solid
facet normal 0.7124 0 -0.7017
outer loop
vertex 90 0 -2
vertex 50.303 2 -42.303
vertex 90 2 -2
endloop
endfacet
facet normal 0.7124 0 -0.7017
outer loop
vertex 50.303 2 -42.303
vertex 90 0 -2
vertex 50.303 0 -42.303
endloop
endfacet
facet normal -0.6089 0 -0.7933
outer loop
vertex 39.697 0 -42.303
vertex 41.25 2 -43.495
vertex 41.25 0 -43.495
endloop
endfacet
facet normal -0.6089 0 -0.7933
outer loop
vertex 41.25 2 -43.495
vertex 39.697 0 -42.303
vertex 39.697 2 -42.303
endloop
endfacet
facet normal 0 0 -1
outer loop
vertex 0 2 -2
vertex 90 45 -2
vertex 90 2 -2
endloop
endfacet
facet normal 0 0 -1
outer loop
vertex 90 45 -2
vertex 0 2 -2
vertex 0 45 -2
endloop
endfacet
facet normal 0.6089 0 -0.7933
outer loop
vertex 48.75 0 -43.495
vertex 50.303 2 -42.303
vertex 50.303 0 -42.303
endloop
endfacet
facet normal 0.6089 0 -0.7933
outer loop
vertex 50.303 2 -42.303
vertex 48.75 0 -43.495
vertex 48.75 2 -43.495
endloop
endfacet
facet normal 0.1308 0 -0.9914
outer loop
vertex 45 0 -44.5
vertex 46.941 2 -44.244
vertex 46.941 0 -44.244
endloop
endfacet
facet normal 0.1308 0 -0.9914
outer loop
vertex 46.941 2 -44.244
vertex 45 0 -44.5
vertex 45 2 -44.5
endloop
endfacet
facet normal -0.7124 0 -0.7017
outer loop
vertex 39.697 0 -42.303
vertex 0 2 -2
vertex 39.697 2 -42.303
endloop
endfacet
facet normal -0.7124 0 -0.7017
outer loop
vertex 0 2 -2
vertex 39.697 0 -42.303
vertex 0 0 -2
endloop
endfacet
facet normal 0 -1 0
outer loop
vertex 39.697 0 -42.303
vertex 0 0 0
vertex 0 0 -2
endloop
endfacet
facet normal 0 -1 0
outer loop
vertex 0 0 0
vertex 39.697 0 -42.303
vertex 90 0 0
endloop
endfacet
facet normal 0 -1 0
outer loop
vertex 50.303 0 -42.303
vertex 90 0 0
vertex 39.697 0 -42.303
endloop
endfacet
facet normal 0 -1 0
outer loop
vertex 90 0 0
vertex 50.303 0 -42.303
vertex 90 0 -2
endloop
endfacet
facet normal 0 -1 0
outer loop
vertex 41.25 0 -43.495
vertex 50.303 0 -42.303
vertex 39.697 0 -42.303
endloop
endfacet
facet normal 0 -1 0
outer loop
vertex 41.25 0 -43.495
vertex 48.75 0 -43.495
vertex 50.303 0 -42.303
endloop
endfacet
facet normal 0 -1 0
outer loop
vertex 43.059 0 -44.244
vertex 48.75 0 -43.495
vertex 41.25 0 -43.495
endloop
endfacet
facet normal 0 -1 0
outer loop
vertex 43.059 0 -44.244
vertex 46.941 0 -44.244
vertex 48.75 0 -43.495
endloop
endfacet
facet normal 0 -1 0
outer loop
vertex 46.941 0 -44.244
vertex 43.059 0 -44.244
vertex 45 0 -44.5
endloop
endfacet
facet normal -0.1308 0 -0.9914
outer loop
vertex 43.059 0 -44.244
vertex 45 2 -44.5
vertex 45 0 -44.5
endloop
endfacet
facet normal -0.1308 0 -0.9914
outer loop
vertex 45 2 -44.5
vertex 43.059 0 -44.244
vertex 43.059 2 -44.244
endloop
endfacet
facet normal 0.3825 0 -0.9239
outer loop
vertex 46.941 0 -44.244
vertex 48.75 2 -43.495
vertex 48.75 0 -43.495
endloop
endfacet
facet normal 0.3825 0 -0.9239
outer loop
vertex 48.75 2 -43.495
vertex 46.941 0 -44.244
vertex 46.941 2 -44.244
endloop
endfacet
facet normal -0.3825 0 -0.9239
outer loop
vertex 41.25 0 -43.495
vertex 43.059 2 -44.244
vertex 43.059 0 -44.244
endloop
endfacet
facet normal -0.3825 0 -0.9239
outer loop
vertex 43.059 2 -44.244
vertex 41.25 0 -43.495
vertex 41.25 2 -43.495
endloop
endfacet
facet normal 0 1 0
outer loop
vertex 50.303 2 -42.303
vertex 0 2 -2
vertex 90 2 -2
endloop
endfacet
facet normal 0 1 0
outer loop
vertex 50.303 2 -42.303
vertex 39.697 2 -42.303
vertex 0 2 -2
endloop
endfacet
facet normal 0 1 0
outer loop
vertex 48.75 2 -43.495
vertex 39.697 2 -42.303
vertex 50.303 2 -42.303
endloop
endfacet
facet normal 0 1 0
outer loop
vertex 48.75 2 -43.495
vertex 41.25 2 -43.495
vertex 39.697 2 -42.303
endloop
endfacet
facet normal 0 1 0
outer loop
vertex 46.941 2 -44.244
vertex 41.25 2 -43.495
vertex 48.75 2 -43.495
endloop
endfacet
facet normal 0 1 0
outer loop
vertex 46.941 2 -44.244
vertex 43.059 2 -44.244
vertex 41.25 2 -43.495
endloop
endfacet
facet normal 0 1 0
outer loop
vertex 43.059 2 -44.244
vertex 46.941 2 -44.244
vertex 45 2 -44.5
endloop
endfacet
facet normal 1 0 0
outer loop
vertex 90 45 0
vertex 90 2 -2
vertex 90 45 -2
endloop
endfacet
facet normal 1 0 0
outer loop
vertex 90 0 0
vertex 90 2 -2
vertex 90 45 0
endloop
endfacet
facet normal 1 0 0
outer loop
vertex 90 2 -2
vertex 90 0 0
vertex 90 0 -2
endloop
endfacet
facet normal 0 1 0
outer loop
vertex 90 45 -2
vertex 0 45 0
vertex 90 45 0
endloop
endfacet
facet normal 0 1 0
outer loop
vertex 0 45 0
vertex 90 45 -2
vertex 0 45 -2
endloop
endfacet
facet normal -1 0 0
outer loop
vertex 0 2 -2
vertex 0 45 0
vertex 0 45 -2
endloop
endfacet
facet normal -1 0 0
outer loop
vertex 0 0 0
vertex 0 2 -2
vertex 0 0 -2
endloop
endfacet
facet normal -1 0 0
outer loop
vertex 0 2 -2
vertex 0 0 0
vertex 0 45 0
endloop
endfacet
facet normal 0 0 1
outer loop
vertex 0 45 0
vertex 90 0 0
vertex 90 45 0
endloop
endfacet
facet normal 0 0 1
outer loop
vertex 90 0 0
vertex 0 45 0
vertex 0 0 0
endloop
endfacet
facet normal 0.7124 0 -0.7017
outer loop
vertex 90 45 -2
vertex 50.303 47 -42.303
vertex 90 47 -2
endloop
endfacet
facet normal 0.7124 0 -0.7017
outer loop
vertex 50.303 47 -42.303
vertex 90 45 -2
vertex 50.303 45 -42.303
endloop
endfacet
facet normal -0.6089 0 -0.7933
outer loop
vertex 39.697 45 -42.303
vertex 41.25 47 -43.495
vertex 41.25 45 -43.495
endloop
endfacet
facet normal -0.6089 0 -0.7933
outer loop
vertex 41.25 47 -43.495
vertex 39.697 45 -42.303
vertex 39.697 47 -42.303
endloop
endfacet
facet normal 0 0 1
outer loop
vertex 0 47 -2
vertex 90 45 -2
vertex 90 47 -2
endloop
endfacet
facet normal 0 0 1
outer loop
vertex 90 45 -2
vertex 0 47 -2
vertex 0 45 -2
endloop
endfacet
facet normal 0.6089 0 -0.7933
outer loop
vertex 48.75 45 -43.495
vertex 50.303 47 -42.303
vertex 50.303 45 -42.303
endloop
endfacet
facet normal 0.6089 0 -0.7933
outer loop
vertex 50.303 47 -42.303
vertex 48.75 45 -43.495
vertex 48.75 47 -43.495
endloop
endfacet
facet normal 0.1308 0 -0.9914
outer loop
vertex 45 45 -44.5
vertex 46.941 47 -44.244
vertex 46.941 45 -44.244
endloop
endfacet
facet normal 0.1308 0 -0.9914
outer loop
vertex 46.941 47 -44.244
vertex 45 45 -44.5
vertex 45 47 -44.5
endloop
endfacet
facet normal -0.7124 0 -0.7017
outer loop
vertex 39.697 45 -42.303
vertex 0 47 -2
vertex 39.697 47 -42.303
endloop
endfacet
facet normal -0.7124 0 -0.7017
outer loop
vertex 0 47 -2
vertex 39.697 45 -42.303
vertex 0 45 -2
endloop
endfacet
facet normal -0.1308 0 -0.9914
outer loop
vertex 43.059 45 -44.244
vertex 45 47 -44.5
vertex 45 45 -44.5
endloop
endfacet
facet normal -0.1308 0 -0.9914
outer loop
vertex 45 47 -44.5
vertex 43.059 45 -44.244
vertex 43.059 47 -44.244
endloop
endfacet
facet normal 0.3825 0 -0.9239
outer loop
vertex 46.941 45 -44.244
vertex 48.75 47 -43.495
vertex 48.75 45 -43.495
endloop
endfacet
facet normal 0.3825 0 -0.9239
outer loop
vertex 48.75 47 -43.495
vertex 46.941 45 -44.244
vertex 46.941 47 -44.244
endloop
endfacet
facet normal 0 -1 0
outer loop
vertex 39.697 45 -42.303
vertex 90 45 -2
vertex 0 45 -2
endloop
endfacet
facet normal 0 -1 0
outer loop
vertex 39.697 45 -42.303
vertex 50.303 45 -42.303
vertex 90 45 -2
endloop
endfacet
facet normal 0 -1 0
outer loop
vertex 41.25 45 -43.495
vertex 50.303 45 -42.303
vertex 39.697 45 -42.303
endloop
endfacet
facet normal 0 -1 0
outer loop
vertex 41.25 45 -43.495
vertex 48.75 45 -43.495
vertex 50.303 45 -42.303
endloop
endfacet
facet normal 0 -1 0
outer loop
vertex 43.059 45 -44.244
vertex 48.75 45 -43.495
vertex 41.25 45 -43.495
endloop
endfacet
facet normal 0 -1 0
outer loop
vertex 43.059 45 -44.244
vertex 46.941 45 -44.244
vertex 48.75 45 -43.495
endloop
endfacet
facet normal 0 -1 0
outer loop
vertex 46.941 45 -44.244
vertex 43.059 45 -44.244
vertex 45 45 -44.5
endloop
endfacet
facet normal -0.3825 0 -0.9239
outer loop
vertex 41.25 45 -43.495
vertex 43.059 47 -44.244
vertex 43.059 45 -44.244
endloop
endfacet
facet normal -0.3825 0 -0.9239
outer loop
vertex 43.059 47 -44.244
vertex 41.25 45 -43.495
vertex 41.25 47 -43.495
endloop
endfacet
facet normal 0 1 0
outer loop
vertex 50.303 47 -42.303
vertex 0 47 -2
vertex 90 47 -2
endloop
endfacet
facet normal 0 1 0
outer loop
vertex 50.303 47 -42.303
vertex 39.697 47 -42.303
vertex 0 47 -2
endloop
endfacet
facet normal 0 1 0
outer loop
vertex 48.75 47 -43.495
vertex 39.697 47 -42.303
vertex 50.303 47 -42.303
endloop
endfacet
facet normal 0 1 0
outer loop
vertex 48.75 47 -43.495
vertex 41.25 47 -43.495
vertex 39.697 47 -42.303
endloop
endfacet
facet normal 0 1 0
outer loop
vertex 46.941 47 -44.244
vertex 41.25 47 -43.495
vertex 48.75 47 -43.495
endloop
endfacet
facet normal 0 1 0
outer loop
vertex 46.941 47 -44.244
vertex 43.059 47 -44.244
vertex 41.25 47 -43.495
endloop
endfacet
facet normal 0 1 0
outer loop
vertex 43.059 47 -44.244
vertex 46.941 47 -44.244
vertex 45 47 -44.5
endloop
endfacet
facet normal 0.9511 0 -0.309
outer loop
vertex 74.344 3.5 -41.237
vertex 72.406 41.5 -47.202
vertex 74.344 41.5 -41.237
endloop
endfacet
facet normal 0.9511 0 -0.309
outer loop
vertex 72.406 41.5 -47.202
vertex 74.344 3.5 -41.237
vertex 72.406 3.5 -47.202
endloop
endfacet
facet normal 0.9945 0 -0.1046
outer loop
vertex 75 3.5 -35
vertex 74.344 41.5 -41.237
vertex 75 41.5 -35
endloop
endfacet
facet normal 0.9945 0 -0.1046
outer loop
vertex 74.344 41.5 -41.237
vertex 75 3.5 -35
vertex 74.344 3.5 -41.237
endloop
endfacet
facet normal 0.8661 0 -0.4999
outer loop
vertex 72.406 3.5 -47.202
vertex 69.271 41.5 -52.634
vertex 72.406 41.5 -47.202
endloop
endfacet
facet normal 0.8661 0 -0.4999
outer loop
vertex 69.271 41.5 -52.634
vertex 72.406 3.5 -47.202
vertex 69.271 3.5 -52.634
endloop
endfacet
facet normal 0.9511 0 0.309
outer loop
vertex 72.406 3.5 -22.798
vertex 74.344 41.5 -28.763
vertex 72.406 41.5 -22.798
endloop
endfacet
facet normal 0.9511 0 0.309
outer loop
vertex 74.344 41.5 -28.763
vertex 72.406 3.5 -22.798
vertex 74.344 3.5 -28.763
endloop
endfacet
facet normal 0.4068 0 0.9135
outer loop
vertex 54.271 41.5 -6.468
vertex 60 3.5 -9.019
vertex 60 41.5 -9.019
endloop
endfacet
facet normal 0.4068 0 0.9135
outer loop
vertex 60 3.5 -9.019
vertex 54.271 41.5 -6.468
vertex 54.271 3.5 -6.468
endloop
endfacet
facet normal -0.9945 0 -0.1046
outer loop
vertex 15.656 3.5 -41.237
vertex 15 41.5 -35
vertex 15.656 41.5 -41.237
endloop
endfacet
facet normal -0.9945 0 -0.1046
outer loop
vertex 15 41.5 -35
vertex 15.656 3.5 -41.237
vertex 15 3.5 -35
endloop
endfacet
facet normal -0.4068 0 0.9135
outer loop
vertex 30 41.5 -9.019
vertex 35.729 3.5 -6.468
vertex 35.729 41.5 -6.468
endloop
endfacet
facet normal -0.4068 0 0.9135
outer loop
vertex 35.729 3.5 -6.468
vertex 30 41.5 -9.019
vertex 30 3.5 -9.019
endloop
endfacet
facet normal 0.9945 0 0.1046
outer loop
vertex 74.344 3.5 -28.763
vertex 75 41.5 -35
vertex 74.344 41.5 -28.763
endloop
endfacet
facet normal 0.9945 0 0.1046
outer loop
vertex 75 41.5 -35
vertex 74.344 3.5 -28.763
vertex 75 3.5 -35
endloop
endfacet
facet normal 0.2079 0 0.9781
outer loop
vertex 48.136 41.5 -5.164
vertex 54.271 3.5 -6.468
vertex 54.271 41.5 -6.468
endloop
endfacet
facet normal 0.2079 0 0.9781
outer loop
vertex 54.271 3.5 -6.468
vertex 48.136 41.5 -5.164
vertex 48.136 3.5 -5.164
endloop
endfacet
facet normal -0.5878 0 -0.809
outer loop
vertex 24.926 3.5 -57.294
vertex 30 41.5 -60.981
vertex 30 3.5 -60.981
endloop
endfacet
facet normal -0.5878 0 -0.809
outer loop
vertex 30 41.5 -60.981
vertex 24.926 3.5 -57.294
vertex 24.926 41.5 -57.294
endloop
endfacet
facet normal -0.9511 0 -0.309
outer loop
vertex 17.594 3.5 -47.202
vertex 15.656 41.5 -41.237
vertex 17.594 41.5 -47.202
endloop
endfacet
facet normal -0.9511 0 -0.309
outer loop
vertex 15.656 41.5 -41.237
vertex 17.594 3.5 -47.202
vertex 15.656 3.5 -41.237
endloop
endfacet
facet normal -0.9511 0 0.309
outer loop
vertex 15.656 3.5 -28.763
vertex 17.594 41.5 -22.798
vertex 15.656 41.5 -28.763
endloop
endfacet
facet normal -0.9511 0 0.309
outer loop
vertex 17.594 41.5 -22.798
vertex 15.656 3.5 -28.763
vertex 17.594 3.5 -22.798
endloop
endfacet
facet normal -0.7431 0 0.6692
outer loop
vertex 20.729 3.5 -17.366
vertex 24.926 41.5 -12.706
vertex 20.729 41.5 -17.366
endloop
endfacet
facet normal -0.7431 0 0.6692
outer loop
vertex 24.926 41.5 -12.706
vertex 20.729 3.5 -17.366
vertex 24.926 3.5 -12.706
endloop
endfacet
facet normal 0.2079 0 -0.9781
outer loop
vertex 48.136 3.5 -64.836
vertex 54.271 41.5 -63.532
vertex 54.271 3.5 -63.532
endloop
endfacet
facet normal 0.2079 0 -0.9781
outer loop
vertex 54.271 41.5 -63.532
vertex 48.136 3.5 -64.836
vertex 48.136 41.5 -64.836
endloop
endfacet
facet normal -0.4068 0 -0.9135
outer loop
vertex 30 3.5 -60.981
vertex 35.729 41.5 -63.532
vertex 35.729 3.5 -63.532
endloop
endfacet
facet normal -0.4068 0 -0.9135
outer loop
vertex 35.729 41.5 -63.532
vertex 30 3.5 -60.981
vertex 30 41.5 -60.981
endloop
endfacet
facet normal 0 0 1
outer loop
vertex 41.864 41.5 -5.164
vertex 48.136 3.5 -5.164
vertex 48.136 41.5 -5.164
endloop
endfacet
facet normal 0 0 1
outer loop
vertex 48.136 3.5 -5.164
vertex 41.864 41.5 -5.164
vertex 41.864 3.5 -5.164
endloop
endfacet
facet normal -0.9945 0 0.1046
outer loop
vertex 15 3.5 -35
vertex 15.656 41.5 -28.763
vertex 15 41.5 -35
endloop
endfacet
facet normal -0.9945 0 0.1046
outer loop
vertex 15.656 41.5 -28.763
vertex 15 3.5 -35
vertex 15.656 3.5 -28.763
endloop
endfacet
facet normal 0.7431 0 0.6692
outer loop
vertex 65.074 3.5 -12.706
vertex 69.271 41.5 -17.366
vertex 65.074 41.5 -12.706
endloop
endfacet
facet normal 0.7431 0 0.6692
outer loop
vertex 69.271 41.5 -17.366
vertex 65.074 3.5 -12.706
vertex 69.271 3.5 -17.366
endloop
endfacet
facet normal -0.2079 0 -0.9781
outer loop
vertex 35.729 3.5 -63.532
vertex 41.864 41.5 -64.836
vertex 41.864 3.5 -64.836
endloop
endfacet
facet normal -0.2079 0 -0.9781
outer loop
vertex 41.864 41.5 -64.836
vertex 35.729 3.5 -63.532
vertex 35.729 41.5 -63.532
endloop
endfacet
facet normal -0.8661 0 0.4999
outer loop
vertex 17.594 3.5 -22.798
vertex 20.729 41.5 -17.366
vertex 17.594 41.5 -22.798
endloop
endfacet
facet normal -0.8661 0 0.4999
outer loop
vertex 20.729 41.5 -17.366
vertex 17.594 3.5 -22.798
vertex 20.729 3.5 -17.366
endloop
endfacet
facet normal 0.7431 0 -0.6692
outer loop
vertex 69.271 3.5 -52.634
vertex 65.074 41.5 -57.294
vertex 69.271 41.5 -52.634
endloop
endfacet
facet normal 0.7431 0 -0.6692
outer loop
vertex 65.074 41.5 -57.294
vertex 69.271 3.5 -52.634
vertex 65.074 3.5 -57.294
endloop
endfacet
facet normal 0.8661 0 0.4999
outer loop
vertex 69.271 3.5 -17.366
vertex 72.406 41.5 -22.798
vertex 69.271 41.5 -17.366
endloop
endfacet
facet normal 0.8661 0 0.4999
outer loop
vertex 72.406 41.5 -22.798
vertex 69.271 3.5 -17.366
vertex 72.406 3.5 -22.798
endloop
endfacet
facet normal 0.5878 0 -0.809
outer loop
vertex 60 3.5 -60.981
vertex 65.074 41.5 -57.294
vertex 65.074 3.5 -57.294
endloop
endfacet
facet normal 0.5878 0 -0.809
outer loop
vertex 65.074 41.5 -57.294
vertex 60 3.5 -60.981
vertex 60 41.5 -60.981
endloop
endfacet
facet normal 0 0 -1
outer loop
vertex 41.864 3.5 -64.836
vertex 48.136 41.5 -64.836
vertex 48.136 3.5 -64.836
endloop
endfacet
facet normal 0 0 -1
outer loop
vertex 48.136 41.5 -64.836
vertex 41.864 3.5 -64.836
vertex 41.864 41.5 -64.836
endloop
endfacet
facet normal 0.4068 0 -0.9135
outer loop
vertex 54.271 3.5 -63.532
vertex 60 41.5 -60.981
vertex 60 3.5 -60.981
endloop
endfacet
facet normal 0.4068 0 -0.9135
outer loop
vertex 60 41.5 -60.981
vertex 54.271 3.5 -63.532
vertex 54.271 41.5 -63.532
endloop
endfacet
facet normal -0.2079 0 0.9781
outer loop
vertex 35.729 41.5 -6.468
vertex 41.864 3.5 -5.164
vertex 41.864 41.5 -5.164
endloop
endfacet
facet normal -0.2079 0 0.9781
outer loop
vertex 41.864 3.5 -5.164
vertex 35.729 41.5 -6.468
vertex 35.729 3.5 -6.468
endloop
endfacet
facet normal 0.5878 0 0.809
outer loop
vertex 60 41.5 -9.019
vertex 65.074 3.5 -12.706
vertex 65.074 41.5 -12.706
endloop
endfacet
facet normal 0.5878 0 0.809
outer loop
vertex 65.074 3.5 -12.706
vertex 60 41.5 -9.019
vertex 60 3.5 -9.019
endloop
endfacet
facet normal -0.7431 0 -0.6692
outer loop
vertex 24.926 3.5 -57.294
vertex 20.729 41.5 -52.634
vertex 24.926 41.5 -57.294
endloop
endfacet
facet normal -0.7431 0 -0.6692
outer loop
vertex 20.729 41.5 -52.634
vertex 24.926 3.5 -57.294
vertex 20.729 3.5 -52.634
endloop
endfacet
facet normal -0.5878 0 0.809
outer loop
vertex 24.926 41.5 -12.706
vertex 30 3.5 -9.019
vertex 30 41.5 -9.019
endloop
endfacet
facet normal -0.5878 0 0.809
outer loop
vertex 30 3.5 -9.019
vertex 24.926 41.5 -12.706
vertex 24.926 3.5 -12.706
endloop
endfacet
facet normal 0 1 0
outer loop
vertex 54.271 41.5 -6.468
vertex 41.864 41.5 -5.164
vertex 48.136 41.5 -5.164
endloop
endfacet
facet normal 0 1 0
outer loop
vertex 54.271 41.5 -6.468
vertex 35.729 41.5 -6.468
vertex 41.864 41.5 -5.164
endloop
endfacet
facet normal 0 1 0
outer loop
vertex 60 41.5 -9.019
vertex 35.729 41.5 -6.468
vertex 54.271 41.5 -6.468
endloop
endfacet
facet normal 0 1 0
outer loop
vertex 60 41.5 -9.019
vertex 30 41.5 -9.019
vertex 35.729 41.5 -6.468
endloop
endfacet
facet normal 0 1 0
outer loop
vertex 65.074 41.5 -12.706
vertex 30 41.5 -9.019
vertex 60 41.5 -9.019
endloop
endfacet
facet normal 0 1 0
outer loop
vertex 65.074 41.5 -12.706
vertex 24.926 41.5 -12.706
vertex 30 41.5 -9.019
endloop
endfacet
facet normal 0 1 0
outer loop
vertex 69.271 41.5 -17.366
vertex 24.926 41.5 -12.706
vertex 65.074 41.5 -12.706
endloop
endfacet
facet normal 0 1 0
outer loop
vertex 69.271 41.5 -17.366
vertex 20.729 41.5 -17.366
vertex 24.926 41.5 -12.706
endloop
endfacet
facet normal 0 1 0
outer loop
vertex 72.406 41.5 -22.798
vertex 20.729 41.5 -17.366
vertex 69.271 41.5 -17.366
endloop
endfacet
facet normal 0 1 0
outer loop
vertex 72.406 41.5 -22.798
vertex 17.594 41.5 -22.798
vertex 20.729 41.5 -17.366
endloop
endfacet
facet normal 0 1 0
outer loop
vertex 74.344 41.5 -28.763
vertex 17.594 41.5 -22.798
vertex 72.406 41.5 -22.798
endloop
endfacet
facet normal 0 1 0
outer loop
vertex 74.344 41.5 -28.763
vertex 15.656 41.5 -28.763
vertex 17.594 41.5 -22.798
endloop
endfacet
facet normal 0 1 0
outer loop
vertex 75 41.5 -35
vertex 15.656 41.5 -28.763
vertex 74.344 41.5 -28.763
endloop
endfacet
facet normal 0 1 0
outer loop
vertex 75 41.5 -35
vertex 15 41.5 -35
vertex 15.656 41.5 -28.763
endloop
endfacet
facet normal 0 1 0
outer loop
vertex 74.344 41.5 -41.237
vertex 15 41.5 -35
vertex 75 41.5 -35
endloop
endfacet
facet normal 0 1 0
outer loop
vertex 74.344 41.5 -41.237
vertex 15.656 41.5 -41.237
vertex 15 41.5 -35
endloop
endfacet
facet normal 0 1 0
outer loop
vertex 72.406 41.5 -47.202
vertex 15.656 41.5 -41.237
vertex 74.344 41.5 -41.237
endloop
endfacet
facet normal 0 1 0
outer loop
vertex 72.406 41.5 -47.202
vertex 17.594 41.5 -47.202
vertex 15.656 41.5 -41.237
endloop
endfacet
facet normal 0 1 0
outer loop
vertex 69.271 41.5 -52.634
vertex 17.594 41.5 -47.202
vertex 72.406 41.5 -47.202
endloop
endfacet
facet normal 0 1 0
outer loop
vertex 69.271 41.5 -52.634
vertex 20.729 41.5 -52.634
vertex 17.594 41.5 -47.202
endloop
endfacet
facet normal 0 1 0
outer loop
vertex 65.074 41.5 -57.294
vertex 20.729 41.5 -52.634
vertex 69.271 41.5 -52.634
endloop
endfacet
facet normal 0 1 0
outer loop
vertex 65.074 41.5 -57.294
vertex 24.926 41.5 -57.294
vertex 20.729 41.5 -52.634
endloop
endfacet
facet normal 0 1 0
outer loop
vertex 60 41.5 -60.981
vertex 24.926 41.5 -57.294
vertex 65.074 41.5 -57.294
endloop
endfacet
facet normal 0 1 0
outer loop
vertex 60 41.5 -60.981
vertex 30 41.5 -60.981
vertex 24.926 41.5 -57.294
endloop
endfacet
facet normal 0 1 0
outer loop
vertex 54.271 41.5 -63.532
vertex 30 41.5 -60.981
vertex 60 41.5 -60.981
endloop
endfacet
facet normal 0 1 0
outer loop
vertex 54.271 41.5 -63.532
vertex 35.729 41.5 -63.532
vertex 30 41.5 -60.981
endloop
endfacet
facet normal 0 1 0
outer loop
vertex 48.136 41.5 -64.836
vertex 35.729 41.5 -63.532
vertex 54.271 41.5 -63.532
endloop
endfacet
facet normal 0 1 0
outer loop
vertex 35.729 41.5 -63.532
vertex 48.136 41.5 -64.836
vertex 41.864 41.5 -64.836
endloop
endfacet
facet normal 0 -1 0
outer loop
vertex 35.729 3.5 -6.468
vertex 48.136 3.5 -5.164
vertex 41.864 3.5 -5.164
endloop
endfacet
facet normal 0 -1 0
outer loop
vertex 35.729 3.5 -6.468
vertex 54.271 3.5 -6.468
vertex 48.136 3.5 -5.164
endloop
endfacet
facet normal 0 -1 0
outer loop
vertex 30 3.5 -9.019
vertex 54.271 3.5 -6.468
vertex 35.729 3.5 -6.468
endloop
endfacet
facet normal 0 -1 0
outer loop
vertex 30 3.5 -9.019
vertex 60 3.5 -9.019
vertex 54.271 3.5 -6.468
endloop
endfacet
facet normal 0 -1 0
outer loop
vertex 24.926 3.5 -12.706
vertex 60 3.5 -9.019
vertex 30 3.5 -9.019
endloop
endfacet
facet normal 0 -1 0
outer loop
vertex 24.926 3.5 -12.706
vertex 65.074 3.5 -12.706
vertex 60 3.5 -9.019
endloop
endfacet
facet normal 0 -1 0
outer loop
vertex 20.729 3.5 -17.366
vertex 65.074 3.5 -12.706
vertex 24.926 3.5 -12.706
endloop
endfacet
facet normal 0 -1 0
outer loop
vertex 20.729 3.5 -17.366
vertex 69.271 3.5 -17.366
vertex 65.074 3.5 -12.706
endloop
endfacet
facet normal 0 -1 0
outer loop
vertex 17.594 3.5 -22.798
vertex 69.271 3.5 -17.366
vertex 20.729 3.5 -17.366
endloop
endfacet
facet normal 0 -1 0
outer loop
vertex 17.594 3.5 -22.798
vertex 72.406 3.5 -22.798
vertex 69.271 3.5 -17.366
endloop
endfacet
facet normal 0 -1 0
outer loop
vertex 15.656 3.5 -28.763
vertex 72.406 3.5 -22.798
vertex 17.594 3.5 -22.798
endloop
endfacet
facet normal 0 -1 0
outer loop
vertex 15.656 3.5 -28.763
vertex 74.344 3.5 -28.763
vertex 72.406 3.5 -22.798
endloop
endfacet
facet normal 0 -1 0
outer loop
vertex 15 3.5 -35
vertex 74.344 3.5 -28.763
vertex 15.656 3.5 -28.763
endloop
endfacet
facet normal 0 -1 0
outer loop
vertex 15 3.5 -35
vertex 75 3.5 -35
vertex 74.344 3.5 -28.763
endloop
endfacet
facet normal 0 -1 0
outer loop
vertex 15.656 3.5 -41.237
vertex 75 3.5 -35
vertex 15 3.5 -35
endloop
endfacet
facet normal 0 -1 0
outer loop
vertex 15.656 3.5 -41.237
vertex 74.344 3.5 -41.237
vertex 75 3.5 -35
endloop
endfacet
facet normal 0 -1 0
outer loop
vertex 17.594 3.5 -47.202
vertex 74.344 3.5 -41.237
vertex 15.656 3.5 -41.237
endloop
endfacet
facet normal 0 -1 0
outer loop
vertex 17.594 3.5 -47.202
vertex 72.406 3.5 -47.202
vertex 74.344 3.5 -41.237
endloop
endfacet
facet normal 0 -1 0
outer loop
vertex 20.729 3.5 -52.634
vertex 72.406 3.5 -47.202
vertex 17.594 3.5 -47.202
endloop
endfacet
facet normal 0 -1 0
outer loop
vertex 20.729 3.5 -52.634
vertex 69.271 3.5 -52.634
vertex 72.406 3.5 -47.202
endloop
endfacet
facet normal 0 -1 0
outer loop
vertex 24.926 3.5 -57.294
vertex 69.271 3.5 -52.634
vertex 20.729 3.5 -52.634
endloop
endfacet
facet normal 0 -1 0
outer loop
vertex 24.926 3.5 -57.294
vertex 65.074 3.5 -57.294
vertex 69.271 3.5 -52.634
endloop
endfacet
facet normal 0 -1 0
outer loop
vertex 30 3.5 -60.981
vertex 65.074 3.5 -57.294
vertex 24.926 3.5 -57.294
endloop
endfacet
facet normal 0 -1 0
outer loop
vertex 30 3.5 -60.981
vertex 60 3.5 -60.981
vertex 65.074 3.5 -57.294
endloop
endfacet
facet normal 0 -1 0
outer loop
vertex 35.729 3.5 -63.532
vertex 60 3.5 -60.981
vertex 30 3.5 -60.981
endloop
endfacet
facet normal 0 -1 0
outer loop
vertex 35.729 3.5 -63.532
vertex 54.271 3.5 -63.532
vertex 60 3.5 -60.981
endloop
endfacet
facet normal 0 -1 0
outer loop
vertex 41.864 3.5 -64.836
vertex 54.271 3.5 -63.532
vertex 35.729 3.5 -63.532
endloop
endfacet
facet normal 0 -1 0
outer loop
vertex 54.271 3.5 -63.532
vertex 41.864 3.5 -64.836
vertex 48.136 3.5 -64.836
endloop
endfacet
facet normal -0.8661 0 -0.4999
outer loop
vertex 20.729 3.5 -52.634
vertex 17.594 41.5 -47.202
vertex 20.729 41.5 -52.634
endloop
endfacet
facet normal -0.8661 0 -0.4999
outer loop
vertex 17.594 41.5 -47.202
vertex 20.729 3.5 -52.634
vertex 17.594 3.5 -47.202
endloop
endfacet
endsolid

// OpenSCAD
module sidebracket(){
    //厚み
    linear_extrude(height = 2)
    hull() {
      polygon([[0,0],[45,20],[90,0]]);
      translate([45,35,0]) circle(d=15);
    }
}

module tirebracket(){
    translate([0,2,0])sidebracket();
    translate([0,0,0])cube([90, 2, 45] );
    translate([0,2,45])sidebracket();
}

//tirebracket();

module tireunit(){
    rotate([-90,0,0]){
    tredwidth = 38;
    tirebracket();
    translate([45, 35, (45-tredwidth)/2])
    cylinder(h=tredwidth, r=30);
}}

tireunit();
